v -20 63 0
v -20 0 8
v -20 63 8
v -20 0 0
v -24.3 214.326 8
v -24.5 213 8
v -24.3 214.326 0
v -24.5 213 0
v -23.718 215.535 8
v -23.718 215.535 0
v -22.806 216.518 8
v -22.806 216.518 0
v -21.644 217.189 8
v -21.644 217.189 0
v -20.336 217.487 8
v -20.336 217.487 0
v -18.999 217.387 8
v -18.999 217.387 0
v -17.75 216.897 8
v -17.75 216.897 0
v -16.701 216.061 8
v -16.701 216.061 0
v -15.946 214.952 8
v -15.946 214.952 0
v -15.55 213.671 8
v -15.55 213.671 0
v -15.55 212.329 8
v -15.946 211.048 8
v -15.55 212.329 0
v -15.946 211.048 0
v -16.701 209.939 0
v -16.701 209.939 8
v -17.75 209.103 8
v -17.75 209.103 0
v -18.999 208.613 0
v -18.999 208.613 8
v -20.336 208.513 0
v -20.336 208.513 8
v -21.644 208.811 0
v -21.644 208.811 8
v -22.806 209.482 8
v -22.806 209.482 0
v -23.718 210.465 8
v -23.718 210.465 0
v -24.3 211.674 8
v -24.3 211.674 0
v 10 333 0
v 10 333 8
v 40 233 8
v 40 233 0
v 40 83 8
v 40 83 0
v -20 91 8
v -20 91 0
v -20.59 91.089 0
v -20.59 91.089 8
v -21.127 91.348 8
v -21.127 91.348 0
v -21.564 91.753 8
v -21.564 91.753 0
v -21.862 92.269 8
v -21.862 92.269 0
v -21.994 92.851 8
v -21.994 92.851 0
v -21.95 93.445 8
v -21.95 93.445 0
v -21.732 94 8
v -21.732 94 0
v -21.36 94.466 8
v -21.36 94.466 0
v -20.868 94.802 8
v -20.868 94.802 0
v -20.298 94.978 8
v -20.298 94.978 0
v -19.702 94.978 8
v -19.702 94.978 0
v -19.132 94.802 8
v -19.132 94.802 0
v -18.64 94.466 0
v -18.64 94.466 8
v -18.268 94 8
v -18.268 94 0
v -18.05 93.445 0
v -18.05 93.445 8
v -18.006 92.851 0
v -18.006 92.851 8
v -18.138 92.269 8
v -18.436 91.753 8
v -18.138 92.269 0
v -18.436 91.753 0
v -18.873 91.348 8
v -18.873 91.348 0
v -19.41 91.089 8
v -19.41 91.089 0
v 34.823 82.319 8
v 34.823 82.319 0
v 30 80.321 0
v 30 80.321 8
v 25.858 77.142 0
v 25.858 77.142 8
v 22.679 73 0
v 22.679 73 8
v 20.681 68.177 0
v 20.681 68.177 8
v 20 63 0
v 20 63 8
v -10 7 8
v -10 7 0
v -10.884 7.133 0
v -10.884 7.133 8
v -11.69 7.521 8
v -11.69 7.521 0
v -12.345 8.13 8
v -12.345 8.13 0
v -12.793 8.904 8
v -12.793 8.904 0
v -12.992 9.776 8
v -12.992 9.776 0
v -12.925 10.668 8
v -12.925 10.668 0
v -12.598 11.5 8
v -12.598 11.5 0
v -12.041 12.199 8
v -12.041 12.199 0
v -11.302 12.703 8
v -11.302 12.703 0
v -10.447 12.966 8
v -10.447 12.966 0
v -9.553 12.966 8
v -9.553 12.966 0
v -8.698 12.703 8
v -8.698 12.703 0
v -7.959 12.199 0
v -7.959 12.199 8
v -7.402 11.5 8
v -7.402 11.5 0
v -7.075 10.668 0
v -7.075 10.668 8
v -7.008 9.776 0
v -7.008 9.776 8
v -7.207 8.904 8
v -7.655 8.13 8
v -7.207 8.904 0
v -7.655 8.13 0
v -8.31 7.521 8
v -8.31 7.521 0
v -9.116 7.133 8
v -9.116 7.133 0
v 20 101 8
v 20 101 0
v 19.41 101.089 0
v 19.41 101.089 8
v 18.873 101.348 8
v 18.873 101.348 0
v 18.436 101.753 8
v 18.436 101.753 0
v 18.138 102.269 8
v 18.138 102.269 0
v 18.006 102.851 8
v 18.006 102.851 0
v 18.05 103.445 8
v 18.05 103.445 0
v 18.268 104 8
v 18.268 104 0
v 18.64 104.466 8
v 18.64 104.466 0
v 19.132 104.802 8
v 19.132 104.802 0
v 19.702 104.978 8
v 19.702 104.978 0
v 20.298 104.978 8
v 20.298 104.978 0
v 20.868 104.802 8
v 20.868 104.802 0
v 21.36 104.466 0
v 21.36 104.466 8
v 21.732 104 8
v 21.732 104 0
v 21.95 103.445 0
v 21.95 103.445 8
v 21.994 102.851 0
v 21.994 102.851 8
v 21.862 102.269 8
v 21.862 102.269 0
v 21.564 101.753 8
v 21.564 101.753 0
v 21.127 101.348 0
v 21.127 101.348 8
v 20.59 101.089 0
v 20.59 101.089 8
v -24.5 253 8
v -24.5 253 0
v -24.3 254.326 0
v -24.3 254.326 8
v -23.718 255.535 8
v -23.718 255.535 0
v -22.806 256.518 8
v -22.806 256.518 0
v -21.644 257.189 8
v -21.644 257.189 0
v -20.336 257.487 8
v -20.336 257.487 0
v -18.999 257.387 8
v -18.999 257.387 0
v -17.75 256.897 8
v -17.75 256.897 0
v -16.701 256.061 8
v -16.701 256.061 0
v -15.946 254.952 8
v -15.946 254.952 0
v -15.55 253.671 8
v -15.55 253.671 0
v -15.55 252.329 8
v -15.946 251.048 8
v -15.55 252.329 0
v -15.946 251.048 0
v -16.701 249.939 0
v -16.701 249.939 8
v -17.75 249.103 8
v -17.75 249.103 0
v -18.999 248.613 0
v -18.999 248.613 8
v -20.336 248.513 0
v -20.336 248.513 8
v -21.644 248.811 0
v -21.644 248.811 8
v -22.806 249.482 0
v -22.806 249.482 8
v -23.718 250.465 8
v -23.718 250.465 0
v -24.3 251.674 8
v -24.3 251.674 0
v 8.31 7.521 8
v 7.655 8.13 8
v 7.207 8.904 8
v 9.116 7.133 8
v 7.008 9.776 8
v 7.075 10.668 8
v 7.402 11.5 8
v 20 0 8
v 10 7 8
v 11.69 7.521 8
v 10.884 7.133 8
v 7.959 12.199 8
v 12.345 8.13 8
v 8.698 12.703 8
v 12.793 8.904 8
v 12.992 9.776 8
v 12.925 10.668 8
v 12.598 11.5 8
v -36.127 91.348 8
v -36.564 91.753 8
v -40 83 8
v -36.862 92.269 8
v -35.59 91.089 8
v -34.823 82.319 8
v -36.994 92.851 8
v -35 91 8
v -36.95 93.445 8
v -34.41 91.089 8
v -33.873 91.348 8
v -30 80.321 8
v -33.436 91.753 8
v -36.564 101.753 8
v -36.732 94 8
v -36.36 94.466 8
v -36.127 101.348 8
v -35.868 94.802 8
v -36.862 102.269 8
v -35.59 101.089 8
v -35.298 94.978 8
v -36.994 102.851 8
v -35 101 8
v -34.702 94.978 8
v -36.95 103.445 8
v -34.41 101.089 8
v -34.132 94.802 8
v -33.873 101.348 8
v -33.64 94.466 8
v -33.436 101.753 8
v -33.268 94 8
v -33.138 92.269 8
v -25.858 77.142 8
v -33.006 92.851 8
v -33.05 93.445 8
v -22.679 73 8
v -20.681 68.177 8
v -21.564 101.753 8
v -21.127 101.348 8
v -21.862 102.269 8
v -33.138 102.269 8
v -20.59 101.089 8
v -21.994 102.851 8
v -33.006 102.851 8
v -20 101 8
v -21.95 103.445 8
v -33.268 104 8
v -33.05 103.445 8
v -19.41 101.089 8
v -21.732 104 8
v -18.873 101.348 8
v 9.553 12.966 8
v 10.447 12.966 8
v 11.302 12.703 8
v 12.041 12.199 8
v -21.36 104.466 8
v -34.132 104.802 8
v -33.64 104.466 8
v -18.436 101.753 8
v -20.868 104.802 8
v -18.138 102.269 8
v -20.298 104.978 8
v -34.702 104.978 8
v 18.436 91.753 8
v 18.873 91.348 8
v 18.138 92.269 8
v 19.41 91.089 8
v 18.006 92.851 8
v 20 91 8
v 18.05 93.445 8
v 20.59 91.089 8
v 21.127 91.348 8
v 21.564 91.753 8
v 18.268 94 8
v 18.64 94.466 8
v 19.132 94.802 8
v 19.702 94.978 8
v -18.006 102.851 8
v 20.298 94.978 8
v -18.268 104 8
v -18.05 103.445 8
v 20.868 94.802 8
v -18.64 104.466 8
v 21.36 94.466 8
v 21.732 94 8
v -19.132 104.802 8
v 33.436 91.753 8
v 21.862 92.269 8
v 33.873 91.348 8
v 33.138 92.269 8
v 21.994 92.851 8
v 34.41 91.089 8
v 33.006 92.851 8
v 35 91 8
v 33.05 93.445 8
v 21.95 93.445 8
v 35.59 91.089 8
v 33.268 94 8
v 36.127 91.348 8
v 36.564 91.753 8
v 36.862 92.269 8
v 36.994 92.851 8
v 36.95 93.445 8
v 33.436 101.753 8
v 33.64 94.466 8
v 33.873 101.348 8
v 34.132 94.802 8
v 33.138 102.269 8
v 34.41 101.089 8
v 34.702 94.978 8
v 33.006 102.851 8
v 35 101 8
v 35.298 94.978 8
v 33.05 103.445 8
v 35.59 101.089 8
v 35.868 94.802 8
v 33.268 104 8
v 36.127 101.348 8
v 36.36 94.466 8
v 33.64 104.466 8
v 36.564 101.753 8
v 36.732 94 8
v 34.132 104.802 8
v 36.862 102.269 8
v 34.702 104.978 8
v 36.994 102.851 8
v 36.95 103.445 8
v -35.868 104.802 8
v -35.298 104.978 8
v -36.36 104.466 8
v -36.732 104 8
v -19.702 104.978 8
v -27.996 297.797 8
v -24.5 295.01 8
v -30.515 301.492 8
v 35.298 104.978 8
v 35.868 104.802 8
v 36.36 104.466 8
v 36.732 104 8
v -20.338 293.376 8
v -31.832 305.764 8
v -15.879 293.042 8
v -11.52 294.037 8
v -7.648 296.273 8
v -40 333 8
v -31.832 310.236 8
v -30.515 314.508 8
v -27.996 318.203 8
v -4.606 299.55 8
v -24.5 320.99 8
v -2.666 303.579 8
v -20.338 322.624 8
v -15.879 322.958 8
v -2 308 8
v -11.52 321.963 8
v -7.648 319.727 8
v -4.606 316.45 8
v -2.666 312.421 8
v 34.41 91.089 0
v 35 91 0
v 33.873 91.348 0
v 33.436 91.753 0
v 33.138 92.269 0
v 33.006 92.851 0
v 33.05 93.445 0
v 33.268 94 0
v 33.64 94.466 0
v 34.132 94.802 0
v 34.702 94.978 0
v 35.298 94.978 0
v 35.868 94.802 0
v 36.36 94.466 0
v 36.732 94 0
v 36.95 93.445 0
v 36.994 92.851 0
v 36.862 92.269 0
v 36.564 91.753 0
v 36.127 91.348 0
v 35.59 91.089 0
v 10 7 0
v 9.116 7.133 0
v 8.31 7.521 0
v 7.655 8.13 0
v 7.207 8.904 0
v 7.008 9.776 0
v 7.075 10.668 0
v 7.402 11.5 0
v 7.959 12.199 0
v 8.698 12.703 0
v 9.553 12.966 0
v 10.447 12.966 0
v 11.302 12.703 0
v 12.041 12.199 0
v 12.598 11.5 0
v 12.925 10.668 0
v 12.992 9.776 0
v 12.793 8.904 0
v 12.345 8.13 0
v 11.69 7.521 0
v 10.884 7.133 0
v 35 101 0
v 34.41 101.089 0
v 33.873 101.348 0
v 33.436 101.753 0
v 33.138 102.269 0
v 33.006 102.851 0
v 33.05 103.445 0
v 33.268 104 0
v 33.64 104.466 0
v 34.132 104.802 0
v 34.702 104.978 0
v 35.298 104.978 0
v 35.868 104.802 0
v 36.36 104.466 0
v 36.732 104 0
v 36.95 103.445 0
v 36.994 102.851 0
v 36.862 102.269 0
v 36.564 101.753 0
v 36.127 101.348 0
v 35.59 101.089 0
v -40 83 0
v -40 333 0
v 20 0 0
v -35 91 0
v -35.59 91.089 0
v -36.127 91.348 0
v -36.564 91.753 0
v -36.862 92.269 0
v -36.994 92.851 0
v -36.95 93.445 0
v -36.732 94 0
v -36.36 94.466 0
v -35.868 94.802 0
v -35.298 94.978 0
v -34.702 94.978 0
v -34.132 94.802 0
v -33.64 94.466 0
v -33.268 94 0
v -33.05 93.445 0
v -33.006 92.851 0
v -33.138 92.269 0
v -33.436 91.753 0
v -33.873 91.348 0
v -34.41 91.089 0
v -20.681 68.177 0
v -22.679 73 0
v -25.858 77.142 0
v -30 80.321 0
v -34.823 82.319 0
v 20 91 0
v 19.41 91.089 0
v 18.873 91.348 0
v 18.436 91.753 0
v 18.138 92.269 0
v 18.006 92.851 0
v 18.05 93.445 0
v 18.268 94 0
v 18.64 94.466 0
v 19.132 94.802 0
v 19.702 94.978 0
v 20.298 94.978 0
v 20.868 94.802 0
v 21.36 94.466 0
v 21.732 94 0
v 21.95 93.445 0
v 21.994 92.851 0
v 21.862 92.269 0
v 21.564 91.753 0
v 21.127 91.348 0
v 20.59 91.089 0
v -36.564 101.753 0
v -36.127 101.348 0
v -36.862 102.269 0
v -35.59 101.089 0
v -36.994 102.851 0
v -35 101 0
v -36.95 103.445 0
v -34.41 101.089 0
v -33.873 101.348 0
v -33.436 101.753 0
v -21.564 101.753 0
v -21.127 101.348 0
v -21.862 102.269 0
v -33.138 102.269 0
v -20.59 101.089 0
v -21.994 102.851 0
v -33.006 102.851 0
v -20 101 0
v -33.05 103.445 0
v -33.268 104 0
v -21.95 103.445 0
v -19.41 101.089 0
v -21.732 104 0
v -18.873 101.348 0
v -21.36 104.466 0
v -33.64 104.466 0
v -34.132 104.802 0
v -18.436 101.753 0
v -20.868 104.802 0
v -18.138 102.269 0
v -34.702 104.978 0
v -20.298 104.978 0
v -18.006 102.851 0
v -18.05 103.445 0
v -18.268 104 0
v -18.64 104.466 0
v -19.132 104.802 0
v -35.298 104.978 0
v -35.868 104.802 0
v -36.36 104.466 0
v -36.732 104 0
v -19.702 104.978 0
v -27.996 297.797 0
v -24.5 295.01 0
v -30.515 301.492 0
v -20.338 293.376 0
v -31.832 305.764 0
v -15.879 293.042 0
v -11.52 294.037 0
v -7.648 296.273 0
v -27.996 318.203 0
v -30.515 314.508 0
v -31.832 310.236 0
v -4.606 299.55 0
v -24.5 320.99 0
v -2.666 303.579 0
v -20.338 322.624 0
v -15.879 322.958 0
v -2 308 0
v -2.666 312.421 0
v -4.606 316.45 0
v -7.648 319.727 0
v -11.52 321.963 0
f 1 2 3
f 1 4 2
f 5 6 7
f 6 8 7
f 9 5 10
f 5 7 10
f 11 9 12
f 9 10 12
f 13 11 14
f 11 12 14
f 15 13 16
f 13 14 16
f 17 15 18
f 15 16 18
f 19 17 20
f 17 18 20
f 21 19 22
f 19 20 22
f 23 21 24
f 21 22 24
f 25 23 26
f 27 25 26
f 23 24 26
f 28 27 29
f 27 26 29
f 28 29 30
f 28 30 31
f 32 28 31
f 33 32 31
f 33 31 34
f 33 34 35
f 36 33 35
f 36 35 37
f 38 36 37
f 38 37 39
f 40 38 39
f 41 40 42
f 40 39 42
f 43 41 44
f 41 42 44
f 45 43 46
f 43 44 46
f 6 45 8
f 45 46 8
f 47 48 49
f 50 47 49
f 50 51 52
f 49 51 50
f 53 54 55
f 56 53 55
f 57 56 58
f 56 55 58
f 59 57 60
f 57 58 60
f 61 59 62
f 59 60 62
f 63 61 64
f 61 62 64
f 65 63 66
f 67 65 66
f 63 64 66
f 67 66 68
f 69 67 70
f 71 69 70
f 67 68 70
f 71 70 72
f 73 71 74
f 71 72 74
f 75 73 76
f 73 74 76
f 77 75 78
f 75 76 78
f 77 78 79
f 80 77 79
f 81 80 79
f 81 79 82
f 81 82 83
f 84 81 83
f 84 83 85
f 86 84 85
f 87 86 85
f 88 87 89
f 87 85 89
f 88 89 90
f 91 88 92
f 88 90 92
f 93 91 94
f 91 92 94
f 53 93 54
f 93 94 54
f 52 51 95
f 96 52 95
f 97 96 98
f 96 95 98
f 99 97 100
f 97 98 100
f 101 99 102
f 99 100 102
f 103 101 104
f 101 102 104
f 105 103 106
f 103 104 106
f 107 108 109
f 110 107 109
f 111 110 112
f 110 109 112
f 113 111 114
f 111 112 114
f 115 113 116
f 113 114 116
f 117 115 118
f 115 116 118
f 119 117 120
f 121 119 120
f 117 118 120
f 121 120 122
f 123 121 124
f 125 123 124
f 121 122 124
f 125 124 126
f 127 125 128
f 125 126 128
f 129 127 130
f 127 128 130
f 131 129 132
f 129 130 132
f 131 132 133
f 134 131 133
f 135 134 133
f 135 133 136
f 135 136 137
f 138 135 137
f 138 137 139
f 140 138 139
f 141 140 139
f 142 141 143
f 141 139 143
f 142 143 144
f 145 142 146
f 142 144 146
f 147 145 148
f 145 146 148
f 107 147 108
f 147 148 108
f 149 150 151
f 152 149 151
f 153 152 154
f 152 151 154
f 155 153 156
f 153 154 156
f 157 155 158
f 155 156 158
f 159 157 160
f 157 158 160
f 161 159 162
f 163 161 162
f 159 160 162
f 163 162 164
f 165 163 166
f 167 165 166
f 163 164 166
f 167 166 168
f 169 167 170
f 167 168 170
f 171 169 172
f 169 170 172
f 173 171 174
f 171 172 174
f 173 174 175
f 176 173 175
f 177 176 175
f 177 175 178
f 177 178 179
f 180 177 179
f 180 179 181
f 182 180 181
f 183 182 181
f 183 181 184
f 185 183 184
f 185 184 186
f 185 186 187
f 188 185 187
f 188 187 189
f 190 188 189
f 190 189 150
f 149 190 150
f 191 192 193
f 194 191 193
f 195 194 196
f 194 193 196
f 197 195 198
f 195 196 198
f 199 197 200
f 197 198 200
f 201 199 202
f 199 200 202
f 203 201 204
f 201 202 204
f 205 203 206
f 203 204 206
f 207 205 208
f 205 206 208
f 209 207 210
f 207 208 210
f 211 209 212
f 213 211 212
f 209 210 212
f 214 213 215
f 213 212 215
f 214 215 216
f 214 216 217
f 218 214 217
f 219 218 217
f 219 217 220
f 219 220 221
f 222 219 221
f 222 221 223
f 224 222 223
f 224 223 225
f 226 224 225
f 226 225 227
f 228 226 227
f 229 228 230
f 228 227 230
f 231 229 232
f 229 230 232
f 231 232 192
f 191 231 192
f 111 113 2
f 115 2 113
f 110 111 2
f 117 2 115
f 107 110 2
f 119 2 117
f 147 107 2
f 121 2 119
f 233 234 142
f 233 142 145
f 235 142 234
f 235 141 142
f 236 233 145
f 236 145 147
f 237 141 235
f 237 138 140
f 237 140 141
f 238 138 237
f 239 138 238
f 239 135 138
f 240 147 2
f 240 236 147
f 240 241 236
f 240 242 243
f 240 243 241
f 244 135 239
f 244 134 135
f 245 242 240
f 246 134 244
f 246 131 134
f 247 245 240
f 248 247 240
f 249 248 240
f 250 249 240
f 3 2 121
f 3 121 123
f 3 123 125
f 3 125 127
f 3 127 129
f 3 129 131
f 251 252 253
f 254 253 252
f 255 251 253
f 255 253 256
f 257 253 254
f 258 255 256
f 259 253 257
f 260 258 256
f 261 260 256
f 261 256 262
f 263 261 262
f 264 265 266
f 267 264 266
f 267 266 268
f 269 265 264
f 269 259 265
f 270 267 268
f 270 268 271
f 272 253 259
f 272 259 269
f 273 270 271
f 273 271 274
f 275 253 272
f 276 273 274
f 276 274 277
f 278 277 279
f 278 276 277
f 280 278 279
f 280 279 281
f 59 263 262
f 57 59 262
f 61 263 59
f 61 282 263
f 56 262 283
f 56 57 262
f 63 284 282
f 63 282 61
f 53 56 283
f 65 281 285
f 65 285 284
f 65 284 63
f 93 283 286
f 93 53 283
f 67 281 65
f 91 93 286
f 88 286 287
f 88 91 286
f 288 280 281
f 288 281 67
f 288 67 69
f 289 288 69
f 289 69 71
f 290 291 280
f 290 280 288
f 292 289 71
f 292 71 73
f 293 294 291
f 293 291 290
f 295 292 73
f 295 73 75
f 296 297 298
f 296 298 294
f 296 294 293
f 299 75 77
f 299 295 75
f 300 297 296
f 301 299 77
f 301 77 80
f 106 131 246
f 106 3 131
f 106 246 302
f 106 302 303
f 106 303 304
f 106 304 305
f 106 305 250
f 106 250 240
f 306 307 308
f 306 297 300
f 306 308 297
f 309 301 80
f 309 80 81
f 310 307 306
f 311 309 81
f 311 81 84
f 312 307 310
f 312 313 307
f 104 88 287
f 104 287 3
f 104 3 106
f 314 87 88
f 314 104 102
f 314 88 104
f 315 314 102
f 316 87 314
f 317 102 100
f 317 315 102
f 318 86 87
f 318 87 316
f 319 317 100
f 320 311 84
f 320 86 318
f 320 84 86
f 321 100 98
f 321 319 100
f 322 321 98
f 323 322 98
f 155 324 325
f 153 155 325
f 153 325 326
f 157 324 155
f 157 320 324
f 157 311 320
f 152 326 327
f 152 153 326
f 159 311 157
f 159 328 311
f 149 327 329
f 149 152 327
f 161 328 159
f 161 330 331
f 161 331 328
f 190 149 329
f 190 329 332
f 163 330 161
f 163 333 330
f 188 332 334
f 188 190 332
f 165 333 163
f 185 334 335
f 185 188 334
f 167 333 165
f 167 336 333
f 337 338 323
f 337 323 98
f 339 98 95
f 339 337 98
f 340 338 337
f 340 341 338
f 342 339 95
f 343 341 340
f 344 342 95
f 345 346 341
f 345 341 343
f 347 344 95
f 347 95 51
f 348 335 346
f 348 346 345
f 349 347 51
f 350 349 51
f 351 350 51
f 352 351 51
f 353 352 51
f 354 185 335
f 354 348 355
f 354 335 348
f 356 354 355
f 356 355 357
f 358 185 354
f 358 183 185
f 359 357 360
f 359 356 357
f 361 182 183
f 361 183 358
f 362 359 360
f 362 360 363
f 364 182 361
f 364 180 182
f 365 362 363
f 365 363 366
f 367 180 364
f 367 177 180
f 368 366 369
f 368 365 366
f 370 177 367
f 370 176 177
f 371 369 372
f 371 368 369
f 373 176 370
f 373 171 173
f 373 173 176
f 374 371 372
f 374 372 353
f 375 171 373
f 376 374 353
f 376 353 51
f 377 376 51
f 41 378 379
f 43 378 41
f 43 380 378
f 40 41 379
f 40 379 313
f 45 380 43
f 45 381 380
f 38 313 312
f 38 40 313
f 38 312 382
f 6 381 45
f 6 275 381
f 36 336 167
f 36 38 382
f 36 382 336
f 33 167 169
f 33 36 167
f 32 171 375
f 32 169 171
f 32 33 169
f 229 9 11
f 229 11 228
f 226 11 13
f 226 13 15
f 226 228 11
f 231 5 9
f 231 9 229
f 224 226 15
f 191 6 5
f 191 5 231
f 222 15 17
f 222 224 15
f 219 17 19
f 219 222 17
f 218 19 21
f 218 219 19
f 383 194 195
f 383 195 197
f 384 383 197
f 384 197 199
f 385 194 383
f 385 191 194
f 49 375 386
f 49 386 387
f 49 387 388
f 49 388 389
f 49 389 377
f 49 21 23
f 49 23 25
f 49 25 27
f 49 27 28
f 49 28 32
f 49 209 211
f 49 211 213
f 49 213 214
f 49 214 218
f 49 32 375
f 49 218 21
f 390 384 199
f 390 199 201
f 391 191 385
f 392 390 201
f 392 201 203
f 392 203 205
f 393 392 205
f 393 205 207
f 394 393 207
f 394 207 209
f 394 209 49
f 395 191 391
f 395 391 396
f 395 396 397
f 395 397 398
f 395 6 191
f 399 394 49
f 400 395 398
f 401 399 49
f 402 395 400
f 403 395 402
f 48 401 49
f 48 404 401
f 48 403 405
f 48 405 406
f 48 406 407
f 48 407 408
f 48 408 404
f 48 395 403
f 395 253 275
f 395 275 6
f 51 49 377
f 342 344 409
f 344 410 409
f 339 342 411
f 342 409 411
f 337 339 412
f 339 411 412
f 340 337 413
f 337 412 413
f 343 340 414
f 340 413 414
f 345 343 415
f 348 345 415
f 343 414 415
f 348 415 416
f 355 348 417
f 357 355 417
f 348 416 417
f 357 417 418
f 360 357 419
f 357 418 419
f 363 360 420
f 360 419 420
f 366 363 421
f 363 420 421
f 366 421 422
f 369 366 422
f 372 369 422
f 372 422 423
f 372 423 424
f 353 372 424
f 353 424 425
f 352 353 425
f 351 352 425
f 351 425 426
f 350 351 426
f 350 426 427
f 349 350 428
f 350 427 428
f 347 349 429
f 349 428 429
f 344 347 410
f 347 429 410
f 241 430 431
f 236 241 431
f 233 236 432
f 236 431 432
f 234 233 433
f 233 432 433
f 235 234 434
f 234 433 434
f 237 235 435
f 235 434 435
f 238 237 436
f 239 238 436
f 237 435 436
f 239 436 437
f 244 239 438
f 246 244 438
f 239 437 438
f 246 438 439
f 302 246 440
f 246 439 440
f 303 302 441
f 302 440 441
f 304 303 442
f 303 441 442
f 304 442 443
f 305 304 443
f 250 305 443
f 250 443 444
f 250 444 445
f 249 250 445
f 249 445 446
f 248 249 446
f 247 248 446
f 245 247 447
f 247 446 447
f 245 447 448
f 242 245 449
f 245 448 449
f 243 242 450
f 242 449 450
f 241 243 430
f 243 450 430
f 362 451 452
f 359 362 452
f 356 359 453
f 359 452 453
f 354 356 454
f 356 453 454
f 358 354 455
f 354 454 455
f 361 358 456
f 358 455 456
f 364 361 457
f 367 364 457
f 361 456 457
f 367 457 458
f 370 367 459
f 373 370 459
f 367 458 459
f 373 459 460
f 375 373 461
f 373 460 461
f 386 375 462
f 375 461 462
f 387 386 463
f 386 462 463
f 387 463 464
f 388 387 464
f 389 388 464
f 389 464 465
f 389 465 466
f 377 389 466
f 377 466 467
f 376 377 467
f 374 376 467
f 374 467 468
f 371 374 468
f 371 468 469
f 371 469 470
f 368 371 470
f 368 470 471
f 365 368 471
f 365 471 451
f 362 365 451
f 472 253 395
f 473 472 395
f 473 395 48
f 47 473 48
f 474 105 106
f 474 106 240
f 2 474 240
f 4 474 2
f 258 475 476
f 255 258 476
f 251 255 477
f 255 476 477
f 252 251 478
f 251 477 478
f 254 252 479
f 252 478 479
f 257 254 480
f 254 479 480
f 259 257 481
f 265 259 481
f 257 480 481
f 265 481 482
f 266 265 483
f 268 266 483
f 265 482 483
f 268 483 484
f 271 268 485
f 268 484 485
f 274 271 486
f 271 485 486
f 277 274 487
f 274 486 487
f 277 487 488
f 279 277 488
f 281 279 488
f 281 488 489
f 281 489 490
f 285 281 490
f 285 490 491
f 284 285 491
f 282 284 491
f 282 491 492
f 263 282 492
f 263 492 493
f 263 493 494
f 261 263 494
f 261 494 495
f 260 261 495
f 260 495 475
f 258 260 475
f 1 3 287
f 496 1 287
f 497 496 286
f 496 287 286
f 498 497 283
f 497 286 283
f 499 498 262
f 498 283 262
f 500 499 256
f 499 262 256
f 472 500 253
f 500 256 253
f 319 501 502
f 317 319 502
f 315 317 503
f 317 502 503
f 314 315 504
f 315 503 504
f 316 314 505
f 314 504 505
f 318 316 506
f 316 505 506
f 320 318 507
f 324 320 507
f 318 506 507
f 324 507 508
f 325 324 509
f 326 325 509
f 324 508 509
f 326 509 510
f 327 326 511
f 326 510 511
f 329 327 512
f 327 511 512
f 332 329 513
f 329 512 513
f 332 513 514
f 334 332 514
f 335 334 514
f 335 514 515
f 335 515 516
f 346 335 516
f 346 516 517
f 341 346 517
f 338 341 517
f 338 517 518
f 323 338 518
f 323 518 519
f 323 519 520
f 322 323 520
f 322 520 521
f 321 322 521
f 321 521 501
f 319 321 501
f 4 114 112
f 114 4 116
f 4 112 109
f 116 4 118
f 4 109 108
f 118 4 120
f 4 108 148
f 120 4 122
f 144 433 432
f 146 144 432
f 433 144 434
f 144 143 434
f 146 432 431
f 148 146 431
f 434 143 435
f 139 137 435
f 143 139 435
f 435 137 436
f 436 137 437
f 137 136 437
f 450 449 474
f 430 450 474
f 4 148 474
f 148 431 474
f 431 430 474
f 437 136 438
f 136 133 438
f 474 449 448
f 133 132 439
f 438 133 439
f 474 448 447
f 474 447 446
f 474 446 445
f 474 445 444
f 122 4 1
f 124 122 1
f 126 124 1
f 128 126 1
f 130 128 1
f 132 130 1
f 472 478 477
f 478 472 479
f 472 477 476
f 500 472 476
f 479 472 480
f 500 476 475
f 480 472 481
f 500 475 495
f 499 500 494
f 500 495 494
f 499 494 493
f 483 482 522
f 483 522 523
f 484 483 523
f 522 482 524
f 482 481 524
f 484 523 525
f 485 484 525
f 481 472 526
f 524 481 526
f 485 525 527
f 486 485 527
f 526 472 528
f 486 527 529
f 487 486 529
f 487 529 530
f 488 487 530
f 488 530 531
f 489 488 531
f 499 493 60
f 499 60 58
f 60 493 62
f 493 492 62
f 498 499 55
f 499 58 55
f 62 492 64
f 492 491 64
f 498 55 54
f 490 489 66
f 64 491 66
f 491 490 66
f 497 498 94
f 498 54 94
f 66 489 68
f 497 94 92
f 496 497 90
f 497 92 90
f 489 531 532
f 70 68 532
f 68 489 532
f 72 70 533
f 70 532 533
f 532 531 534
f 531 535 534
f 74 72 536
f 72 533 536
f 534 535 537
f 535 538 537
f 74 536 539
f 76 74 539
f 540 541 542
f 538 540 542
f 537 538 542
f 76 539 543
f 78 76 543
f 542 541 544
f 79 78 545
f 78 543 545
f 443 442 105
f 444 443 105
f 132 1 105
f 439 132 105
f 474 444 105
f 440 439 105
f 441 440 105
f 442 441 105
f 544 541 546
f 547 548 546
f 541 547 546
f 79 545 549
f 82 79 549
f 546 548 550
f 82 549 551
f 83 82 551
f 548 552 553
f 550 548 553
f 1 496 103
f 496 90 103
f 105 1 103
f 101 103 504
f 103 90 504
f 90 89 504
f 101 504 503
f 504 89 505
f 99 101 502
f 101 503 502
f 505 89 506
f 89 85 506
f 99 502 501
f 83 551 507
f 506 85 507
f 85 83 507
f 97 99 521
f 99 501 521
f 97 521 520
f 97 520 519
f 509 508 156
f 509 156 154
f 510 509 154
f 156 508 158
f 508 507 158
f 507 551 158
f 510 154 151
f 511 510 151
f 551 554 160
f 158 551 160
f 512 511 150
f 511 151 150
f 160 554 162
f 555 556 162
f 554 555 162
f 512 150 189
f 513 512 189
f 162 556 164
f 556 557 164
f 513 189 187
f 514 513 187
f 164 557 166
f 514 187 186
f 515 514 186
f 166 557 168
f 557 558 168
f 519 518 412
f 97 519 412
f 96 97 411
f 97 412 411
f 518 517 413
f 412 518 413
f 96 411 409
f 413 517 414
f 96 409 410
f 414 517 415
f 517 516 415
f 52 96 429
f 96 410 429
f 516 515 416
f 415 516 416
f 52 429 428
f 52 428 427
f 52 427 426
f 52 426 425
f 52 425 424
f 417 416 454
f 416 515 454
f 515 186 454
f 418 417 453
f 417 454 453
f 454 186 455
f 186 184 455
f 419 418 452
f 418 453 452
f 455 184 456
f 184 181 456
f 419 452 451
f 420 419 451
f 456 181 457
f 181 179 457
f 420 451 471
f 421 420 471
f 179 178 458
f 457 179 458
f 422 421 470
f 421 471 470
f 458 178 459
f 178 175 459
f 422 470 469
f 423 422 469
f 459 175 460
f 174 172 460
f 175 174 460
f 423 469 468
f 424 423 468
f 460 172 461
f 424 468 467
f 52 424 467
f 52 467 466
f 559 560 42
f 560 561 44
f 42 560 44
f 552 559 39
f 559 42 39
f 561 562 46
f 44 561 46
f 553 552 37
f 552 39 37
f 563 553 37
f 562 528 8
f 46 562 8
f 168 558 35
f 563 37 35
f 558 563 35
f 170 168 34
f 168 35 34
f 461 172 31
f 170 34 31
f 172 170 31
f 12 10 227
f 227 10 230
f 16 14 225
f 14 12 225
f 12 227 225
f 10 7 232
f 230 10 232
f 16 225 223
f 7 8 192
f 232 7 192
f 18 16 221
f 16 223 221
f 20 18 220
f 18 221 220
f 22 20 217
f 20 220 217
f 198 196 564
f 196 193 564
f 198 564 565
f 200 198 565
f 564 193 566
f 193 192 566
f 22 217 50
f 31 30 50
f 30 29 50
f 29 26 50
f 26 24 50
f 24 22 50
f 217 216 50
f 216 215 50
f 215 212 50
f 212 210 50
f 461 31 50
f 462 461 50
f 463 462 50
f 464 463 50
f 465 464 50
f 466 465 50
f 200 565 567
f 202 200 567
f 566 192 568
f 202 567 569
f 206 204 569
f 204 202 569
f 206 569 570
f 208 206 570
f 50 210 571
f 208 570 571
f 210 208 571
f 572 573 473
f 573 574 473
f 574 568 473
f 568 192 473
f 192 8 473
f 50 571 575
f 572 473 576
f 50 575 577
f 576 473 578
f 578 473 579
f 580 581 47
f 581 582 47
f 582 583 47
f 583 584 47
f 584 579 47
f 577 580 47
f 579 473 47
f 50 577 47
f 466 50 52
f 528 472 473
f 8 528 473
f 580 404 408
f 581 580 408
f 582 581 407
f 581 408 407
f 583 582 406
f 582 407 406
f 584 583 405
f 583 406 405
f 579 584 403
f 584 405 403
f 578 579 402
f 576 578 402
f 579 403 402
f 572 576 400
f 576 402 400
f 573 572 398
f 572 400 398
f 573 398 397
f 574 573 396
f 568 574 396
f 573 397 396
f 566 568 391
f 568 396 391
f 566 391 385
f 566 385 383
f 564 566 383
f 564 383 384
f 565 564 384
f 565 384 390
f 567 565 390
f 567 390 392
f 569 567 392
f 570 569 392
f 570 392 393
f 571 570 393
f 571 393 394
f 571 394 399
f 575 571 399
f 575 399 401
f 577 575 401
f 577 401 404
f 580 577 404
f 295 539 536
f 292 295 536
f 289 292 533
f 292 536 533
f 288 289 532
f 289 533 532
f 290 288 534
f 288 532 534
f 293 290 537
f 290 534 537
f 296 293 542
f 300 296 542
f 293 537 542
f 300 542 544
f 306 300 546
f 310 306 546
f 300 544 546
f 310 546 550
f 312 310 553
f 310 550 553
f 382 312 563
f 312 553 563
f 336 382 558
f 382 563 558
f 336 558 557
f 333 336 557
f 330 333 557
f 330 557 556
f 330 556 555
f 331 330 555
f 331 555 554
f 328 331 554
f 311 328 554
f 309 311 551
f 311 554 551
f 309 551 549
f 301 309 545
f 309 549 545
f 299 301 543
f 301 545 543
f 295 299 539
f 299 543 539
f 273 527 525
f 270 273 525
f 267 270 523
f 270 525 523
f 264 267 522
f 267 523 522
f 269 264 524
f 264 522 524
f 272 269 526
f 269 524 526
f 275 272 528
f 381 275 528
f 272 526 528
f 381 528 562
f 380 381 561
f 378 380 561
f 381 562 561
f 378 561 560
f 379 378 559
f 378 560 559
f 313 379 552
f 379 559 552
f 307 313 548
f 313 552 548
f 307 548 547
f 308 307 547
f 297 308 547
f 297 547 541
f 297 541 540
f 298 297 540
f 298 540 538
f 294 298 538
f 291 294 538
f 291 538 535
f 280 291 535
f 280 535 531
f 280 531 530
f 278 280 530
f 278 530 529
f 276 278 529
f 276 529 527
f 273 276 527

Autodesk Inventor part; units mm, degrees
ref_plane "YZ Plane" through (0, 0, 0) normal (1, 0, 0) x (0, 1, 0)
ref_plane "XZ Plane" through (0, 0, 0) normal (0, 1, 0) x (-1, 0, 0)
ref_plane "XY Plane" through (0, 0, 0) normal (0, 0, 1) x (1, 0, 0)
sketch "Szkic1" plane through (0, 0, 0) normal (0, 0, 1) x (1, 0, 0)
  line L0 (0, 0) -> (20, 0)
  line L1 (0, 0) -> (-20, 0)
  line L2 (-20, 0) -> (-20, 20)
  line L3 (-20, 0) -> (0, 0) construction
  line L4 (-20, 20) -> (20, 20)
  line L5 (20, 20) -> (20, 0)
  line L6 (-20, 0) -> (-20, 88)
  line L7 (-20, 88) -> (20, 88)
  line L8 (20, 88) -> (20, 20)
  line L9 (20, 88) -> (20, 93)
  line L10 (20, 93) -> (-20, 93)
  line L11 (-20, 93) -> (-20, 88)
  line L12 (0, 93) -> (35, 93)
  line L13 (35, 93) -> (40, 93)
  line L14 (0, 93) -> (-35, 93)
  line L15 (-35, 93) -> (-40, 93)
  line L16 (-40, 93) -> (-40, 103)
  line L17 (-40, 103) -> (40, 103)
  line L18 (40, 103) -> (40, 93)
  line L19 (-35, 93) -> (-35, 103)
  line L20 (35, 93) -> (35, 103)
  circle A0 centre (-35, 103) radius 1.5
  circle A1 centre (-35, 93) radius 1.5
  circle A2 centre (35, 103) radius 1.5
  circle A3 centre (35, 93) radius 1.5
  line L21 (40, 93) -> (40, 83)
  line L22 (40, 83) -> (20, 83)
  line L23 (-40, 93) -> (-40, 83)
  line L24 (-40, 83) -> (-20, 83)
  line L25 (-40, 103) -> (-40, 183)
  line L26 (40, 103) -> (40, 183)
  line L27 (40, 183) -> (-40, 183)
  dimension "d0" = 20
  dimension "d1" = 20
  dimension "d2" = 20
  dimension "d3" = 90
  dimension "d4" = 88
  dimension "d5" = 5
  dimension "d6" = 35
  dimension "d7" = 5
  dimension "d8" = 35
  dimension "d9" = 5
  dimension "d10" = 10
  dimension "d11" = 3
  dimension "d12" = 3
  dimension "d13" = 3
  dimension "d14" = 3
  dimension "d15" = 10
  dimension "d16" = 10
  dimension "d17" = 80
  dimension "d18" = 80
extrude "Wyciągnięcie proste1" add sketch "Szkic1" along normal blind 8
sketch "Szkic2" plane through (0, 0, 8) normal (0, 0, 1) x (1, 0, 0)
  circle A0 centre (-35, 103) radius 1.5 projected
  circle A1 centre (-35, 93) radius 1.5 projected
  circle A2 centre (35, 103) radius 1.5 projected
  circle A3 centre (35, 93) radius 1.5 projected
  line L0 (-35, 103) -> (35, 103)
  line L1 (-35, 93) -> (35, 93)
  line L2 (-35, 103) -> (-20, 103)
  line L3 (-20, 103) -> (-20, 93)
  line L4 (35, 103) -> (20, 103)
  line L5 (20, 103) -> (20, 93)
  circle A4 centre (-20, 103) radius 2
  circle A5 centre (-20, 93) radius 2
  circle A6 centre (20, 103) radius 2
  circle A7 centre (20, 93) radius 2
  line L6 (40, 83) -> (40, 183) projected
  line L7 (40, 183) -> (-40, 183) projected
  line L8 (-40, 183) -> (-40, 83) projected
  line L9 (-40, 83) -> (-20, 83) projected
  line L10 (-20, 83) -> (-20, 0) projected
  line L11 (-20, 0) -> (20, 0) projected
  line L12 (20, 0) -> (20, 83) projected
  line L13 (20, 83) -> (40, 83) projected
  line L14 (-20, 0) -> (20, 0) projected
  line L15 (-20, 0) -> (-20, 10)
  line L16 (-20, 83) -> (-20, 0) projected
  line L17 (-20, 10) -> (20, 10)
  line L18 (-20, 10) -> (-10, 10)
  line L19 (20, 10) -> (10, 10)
  circle A8 centre (-10, 10) radius 3
  circle A9 centre (10, 10) radius 3
  point P0 (0, 0)
  dimension "d21" = 15
  dimension "d22" = 15
  dimension "d23" = 4
  dimension "d24" = 4
  dimension "d25" = 4
  dimension "d26" = 4
  dimension "d27" = 10
  dimension "d28" = 10
  dimension "d29" = 10
  dimension "d30" = 6
  dimension "d31" = 6
hole "Otwór1" at (-20, 103, 8) at (-20, 93, 8) at (20, 103, 8) at (20, 93, 8) at (-35, 103, 8) at (-35, 93, 8) at (35, 103, 8) at (35, 93, 8) direction (0, 0, -1) diameter 4 end through all
sketch "Szkic3" plane through (0, 0, 8) normal (0, 0, 1) x (1, 0, 0)
  circle A0 centre (-10, 10) radius 3 projected
  circle A1 centre (10, 10) radius 3 projected
  point P0 (0, 0)
hole "Otwór2" at (-10, 10, 8) at (10, 10, 8) direction (0, 0, -1) diameter 6 end through all
fillet "Zaokrąglenie1" radius 20 2 edges at (20, 83, 4) (-20, 83, 4)
sketch "Szkic4" plane through (0, 0, 8) normal (0, 0, 1) x (1, 0, 0)
  line L0 (40, 183) -> (-40, 183) projected
  line L1 (40, 83) -> (40, 183) projected
  line L2 (40, 183) -> (-40, 183)
  line L3 (-40, 183) -> (-40, 333)
  line L4 (-40, 333) -> (0, 333)
  line L5 (40, 183) -> (40, 233)
  line L6 (40, 233) -> (0, 333)
  point P0 (0, 0)
  dimension "d47" = 150
  dimension "d50" = 50
extrude "Wyciągnięcie proste2" add sketch "Szkic4" against normal up to surface (8 mm away)
sketch "Szkic5" plane through (0, 0, 8) normal (0, 0, 1) x (1, 0, 0)
  line L0 (0, 333) -> (-40, 333) projected
  line L1 (-40, 333) -> (-40, 83) projected
  line L2 (-40, 333) -> (-40, 308)
  line L3 (-40, 308) -> (-17, 308)
  circle A0 centre (-17, 308) radius 15
  point P0 (0, 0)
  dimension "d51" = 25
  dimension "d52" = 23
  dimension "d53" = 30
extrude "Wyciągnięcie proste3" cut sketch "Szkic5" against normal up to next
sketch "Szkic6" plane through (0, 0, 8) normal (0, 0, 1) x (1, 0, 0)
  line L0 (40, 233) -> (0, 333) projected
  line L1 (0, 333) -> (10, 333)
  line L2 (10, 333) -> (40, 233)
  point P0 (0, 0)
  dimension "d56" = 10
extrude "Wyciągnięcie proste4" add sketch "Szkic6" against normal blind 8
sketch "Szkic7" plane through (0, 0, 0) normal (0, 0, -1) x (-1, 0, 0)
  line L0 (40, 83) -> (40, 333) projected
  line L1 (40, 333) -> (40, 263)
  line L2 (40, 263) -> (0, 263)
  line L3 (0, 263) -> (0, 183)
  line L4 (0, 183) -> (40, 183)
  line L5 (40, 263) -> (20, 263)
  line L6 (20, 263) -> (20, 183)
  line L7 (20, 263) -> (20, 253)
  line L8 (20, 183) -> (20, 213)
  circle A0 centre (20, 253) radius 4.5
  circle A1 centre (20, 213) radius 4.5
  point P0 (0, 0)
  dimension "d59" = 70
  dimension "d60" = 40
  dimension "d61" = 80
  dimension "d62" = 20
  dimension "d63" = 10
  dimension "d64" = 30
  dimension "d65" = 9
  dimension "d66" = 9
extrude "Wyciągnięcie proste5" cut sketch "Szkic7" against normal up to next contours A1 L6 | L6 A1 | A0 L6 | L6 A0
properties part number "Wspornik pionowy osi Y - lewa strona"
